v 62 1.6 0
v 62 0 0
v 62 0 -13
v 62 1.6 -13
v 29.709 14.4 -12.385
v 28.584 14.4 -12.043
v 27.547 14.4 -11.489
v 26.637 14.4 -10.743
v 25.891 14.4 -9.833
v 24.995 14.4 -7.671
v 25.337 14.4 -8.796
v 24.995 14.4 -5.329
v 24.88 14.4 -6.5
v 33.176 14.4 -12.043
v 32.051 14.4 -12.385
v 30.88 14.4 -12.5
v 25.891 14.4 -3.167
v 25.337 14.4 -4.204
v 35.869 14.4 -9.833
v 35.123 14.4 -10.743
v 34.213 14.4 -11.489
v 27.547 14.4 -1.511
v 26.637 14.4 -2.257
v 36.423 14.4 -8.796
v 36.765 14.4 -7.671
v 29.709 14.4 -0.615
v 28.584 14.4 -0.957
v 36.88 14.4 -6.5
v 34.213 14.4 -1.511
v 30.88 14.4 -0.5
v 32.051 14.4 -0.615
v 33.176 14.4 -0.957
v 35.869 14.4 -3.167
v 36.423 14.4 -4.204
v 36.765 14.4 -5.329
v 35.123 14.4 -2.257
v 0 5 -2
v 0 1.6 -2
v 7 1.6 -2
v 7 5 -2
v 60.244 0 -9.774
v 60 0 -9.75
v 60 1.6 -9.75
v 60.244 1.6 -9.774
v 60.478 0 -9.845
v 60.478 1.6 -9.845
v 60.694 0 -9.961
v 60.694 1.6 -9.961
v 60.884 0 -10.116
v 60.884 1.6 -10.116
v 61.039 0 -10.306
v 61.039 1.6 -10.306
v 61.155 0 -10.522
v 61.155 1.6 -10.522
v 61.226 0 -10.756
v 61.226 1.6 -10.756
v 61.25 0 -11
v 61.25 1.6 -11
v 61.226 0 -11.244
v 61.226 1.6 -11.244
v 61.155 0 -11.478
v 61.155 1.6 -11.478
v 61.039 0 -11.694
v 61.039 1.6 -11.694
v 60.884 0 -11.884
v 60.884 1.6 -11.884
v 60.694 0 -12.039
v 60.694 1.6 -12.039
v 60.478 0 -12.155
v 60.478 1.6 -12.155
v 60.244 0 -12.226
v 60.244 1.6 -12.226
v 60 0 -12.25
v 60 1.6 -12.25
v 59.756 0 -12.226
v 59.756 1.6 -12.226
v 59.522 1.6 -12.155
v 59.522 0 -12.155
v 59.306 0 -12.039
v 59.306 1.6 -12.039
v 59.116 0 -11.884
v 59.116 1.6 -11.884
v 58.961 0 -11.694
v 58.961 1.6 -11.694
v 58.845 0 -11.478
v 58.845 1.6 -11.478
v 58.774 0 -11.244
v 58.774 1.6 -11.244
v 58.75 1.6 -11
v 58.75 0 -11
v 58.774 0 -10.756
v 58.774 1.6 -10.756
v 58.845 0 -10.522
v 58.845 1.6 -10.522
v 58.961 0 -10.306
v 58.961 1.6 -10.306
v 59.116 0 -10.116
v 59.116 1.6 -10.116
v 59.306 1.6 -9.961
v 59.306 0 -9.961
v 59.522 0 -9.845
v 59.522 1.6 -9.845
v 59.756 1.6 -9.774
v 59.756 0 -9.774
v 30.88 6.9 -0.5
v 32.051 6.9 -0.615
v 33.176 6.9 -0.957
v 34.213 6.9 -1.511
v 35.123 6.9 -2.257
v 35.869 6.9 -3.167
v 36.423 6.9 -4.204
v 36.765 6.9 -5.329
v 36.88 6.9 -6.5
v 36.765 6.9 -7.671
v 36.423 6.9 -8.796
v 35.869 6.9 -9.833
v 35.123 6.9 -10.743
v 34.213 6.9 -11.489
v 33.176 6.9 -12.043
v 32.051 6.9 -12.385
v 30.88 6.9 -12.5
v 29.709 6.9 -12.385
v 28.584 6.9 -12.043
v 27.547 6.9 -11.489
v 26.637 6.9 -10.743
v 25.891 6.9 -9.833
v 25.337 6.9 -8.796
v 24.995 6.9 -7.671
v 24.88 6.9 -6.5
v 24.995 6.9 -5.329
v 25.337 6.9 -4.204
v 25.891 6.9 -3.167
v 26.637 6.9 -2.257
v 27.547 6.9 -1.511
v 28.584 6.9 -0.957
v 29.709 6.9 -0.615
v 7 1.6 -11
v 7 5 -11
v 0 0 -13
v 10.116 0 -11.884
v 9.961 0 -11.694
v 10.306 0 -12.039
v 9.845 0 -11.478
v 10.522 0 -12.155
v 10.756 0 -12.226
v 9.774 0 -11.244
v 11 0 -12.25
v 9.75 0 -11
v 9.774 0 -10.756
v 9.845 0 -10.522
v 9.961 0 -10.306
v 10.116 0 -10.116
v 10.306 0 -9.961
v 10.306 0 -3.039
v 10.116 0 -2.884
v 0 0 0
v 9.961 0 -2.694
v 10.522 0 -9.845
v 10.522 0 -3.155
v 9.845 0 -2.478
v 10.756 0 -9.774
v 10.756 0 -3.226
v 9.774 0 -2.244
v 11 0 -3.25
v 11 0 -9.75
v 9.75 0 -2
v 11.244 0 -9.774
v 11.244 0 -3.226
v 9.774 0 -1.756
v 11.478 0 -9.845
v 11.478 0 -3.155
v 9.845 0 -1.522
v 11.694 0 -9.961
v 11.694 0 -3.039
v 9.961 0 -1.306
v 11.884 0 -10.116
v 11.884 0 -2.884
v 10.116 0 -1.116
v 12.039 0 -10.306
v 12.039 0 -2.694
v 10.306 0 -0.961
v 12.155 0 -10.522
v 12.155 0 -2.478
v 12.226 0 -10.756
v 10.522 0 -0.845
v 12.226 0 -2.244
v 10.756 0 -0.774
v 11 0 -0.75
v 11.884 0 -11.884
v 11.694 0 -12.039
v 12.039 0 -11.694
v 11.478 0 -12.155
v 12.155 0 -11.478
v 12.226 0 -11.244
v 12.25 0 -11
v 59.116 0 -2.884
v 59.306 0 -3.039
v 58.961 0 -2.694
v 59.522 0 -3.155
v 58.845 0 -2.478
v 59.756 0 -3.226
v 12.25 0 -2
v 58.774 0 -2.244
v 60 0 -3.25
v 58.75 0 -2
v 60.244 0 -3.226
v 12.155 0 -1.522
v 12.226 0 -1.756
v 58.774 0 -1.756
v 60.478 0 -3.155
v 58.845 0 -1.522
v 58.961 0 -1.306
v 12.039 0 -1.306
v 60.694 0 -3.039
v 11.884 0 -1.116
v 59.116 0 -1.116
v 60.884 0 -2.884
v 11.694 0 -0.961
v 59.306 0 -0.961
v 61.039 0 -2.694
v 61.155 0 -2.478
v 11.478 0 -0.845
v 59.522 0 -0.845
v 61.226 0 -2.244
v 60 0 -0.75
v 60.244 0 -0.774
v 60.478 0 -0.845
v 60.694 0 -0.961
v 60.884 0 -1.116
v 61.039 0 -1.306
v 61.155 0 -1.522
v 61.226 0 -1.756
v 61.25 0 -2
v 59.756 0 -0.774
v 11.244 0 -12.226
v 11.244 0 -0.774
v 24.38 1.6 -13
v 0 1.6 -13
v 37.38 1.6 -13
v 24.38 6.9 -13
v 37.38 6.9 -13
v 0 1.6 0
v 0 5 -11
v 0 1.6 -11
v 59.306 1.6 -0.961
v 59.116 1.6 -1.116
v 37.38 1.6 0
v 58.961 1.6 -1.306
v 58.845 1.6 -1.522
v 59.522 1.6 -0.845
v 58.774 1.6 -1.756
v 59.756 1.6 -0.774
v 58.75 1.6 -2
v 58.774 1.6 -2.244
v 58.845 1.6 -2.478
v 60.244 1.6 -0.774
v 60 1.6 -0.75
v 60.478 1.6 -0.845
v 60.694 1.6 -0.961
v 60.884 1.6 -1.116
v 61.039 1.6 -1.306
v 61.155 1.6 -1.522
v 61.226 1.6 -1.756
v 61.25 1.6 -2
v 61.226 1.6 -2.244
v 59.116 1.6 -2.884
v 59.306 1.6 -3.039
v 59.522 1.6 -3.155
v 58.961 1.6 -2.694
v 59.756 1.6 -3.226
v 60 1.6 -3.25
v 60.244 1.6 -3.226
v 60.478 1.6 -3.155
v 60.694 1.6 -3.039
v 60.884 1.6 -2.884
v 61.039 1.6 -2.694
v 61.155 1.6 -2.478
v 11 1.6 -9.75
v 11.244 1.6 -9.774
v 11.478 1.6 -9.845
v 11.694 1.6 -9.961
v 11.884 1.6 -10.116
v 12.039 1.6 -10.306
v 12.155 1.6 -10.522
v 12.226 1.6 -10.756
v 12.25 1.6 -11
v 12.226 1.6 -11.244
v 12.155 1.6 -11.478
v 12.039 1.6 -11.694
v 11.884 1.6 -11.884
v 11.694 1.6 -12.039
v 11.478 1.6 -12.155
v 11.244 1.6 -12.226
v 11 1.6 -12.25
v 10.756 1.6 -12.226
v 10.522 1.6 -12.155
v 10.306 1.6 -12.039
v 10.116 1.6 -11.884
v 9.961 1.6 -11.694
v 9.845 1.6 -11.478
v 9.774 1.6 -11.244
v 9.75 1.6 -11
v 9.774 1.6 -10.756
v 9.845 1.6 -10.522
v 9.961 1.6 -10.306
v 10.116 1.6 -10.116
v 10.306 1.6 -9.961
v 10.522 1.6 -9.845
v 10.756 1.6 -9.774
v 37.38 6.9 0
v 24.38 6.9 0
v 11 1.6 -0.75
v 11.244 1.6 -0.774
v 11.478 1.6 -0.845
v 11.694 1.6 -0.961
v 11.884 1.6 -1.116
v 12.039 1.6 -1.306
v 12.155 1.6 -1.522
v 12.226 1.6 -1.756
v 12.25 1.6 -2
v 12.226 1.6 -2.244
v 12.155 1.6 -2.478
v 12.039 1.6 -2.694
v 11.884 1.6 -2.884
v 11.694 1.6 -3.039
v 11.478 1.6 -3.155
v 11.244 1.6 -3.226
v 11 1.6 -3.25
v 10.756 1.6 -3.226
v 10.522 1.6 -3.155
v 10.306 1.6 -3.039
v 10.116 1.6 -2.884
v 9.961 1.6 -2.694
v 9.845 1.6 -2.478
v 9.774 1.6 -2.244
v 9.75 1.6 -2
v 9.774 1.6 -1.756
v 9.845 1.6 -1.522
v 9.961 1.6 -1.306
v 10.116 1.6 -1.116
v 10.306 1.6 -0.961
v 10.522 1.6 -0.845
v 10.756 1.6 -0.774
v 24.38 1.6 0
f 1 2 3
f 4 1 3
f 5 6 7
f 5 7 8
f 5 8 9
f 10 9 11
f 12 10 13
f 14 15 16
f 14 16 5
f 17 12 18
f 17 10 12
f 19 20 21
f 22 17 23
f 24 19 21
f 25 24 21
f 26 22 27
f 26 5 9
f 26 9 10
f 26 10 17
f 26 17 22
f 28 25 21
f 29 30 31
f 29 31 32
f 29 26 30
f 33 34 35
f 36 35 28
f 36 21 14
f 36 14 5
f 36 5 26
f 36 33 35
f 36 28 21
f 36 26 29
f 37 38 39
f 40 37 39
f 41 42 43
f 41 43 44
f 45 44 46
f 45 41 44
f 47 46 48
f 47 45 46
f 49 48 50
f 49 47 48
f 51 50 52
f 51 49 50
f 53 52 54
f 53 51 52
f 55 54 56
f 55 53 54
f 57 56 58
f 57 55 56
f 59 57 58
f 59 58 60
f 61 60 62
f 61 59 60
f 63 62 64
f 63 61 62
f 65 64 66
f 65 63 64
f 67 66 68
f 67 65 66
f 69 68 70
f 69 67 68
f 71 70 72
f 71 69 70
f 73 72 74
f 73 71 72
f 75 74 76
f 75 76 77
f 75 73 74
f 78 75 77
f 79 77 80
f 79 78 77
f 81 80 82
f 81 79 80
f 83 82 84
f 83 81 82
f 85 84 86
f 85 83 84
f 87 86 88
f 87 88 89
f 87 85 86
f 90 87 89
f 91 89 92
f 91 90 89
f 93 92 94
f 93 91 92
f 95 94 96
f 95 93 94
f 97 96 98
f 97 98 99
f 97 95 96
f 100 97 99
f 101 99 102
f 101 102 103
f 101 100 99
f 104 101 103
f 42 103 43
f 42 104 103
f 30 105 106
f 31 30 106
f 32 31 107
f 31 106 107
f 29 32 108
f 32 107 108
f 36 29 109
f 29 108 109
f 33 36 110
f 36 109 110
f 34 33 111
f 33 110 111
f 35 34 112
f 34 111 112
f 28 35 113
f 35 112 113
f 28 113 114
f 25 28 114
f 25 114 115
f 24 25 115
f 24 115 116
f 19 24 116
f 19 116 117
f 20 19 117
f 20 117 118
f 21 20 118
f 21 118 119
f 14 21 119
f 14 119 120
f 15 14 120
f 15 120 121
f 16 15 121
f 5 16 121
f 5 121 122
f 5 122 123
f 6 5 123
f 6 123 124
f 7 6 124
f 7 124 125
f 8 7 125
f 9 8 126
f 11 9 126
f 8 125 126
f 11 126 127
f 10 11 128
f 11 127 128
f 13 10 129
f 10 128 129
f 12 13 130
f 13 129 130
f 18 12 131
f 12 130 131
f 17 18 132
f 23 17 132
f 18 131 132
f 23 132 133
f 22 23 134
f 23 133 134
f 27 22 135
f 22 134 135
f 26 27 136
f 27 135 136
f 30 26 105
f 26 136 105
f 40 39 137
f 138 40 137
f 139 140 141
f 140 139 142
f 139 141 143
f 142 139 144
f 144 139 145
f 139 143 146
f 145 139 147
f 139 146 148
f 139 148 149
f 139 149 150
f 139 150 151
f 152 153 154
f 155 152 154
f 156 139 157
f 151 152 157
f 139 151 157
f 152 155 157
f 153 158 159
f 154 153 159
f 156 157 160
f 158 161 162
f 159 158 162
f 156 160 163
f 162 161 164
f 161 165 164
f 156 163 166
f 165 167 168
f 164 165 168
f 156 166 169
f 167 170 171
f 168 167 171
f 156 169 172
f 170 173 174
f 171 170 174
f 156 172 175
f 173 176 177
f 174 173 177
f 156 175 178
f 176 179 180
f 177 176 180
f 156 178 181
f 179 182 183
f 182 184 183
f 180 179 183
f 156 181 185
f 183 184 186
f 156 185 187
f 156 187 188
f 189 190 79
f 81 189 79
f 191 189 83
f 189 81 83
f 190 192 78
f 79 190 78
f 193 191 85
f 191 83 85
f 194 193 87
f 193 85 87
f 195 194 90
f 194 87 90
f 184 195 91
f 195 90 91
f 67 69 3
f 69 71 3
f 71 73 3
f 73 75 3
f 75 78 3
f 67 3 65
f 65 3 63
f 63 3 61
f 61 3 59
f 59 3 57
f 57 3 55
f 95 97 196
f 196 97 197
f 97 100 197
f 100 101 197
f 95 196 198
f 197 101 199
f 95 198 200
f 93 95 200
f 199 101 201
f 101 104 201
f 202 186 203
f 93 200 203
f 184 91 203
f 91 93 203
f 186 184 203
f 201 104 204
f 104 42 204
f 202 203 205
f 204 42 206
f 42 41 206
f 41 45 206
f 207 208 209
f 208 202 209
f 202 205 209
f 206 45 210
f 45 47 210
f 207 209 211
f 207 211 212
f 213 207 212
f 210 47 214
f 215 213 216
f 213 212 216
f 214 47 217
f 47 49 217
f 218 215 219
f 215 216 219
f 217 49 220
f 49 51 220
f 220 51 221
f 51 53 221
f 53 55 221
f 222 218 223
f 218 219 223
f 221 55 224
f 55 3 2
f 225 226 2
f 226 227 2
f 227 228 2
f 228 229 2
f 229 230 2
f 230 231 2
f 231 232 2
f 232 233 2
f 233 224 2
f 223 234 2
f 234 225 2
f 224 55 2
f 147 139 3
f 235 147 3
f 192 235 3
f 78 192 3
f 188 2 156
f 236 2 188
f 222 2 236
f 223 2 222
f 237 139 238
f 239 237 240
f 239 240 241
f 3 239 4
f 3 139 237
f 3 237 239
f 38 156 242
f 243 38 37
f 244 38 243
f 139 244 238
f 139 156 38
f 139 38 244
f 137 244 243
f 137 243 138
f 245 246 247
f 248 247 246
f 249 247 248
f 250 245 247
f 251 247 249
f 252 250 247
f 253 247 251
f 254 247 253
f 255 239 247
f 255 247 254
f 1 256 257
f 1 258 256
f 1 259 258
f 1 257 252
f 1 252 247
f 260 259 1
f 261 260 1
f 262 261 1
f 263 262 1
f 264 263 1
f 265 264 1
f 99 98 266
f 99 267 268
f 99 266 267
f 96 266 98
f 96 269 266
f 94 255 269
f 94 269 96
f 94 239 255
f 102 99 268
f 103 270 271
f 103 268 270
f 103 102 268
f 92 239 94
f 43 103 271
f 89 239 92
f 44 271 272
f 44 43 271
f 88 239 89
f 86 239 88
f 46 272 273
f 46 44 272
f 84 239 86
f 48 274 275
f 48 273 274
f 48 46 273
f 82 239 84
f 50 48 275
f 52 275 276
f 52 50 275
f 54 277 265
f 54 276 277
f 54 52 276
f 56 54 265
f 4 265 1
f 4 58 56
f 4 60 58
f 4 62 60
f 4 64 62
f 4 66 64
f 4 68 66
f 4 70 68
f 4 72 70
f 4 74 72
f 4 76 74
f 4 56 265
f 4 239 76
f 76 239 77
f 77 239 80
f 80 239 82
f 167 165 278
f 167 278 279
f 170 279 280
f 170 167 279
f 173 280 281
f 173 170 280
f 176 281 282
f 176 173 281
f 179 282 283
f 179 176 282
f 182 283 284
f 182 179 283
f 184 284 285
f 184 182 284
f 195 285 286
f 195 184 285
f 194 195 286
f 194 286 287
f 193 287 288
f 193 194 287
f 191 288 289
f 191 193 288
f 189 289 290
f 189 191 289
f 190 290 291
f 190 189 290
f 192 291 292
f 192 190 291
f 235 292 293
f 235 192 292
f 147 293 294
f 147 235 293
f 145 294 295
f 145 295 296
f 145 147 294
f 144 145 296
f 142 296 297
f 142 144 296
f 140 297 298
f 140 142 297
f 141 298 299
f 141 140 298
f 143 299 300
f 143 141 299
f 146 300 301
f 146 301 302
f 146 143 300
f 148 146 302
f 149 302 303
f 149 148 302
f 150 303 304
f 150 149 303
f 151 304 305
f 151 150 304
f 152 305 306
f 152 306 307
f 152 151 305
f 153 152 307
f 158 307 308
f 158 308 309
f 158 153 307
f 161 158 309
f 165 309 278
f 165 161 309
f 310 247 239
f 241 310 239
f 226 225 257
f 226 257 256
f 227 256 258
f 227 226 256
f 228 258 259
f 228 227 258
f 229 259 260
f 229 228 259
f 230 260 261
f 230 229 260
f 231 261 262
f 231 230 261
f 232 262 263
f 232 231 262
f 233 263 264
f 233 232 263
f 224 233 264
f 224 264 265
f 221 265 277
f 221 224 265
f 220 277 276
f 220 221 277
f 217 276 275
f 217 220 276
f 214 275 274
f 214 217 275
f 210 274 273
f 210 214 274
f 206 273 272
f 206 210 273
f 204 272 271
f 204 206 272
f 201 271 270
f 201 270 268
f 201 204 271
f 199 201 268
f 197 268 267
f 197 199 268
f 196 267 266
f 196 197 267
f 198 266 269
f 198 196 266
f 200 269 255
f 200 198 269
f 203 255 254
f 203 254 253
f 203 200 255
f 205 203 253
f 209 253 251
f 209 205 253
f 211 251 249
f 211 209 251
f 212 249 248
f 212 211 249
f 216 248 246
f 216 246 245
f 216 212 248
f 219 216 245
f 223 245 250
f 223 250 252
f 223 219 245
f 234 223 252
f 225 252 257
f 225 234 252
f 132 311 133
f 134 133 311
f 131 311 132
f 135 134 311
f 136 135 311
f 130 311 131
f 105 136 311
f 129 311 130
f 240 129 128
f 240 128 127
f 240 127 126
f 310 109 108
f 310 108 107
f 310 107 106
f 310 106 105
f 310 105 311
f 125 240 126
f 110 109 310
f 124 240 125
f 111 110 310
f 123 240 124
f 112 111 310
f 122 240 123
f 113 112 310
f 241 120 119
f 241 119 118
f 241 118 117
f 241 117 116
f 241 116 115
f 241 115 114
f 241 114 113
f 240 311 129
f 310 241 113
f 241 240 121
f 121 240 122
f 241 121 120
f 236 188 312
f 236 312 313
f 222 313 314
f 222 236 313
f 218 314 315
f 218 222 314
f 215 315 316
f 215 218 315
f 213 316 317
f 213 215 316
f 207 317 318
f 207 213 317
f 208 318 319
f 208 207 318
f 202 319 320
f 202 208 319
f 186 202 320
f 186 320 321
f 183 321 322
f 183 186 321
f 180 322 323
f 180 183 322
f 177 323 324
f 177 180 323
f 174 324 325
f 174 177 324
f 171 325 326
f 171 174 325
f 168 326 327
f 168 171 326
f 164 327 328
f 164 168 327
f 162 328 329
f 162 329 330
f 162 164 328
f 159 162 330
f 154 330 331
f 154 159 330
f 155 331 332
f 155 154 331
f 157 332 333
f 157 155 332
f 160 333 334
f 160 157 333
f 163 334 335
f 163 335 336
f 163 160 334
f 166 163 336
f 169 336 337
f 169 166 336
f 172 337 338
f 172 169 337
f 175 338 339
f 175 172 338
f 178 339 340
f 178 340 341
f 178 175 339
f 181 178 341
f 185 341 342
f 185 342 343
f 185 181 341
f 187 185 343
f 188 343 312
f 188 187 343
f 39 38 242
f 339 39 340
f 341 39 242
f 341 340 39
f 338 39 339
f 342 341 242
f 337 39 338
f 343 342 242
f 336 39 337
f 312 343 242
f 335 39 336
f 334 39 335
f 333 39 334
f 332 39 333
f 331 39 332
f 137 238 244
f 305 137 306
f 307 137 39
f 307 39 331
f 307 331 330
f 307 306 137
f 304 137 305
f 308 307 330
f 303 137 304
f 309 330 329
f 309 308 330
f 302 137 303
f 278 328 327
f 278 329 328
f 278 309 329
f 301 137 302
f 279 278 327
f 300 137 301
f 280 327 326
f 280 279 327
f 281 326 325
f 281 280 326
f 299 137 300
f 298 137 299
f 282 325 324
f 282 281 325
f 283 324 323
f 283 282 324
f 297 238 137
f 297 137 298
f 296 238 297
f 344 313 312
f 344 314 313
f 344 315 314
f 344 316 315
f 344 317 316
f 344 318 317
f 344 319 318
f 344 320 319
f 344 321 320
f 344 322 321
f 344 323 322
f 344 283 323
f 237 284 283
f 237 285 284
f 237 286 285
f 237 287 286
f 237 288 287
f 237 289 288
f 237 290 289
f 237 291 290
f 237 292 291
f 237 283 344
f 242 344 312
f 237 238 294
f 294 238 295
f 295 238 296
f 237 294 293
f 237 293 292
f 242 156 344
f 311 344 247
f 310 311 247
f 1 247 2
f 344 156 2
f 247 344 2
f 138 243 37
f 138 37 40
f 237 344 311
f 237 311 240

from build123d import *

# Parameters (mm, degrees)
SKETCH1_W             = 24.38
SKETCH1_H             = 13
SKETCH1_R             = 1.25
BOSS_EXTRUDE1_DEPTH   = 1.6
SKETCH1_W_2           = 24.62
BOSS_EXTRUDE1_2_DEPTH = 1.6
SKETCH1_3_W           = 13
SKETCH1_3_H           = 13
BOSS_EXTRUDE2_DEPTH   = 6.9
SKETCH1_4_R           = 6
BOSS_EXTRUDE3_DEPTH   = 14.4
SKETCH3_W             = 7
SKETCH3_H             = 9
BOSS_EXTRUDE4_DEPTH   = 3.4


with BuildPart() as part:
    # Sketch1 → Boss-Extrude1 (new body)
    with BuildSketch(Plane(origin=(0, 0, 0), x_dir=(1, 0, 0), z_dir=(0, 1, 0))):
        with Locations((12.19, 6.5)):
            Rectangle(SKETCH1_W, SKETCH1_H)
        with Locations((11, 2)):
            Circle(SKETCH1_R, mode=Mode.SUBTRACT)
        with Locations((11, 11)):
            Circle(SKETCH1_R, mode=Mode.SUBTRACT)
    extrude(amount=BOSS_EXTRUDE1_DEPTH)



with BuildPart() as body_2:
    # Sketch1 → Boss-Extrude1 2 (new body)
    with BuildSketch(Plane(origin=(0, 0, 0), x_dir=(1, 0, 0), z_dir=(0, 1, 0))):
        with Locations((49.69, 6.5)):
            Rectangle(SKETCH1_W_2, SKETCH1_H)
        with Locations((60, 2)):
            Circle(SKETCH1_R, mode=Mode.SUBTRACT)
        with Locations((60, 11)):
            Circle(SKETCH1_R, mode=Mode.SUBTRACT)
    extrude(amount=BOSS_EXTRUDE1_2_DEPTH)


with BuildPart() as part_1:
    add(part.part)

    add(body_2.part)  # Boss-Extrude2 merges body 2
    # Sketch1<3> → Boss-Extrude2 (add)
    with BuildSketch(Plane(origin=(0, 0, 0), x_dir=(1, 0, 0), z_dir=(0, 1, 0))):
        with Locations((30.88, 6.5)):
            Rectangle(SKETCH1_3_W, SKETCH1_3_H)
    extrude(amount=BOSS_EXTRUDE2_DEPTH)

    # Sketch1<4> → Boss-Extrude3 (add)
    with BuildSketch(Plane(origin=(0, 0, 0), x_dir=(1, 0, 0), z_dir=(0, 1, 0))):
        with Locations((30.88, 6.5)):
            Circle(SKETCH1_4_R)
    extrude(amount=BOSS_EXTRUDE3_DEPTH)

    # Sketch3 → Boss-Extrude4 (add)
    with BuildSketch(Plane(origin=(0, 1.6, 0), x_dir=(1, 0, 0), z_dir=(0, 1, 0))):
        with Locations((3.5, 6.5)):
            Rectangle(SKETCH3_W, SKETCH3_H)
    extrude(amount=BOSS_EXTRUDE4_DEPTH)


solid = part_1.part
